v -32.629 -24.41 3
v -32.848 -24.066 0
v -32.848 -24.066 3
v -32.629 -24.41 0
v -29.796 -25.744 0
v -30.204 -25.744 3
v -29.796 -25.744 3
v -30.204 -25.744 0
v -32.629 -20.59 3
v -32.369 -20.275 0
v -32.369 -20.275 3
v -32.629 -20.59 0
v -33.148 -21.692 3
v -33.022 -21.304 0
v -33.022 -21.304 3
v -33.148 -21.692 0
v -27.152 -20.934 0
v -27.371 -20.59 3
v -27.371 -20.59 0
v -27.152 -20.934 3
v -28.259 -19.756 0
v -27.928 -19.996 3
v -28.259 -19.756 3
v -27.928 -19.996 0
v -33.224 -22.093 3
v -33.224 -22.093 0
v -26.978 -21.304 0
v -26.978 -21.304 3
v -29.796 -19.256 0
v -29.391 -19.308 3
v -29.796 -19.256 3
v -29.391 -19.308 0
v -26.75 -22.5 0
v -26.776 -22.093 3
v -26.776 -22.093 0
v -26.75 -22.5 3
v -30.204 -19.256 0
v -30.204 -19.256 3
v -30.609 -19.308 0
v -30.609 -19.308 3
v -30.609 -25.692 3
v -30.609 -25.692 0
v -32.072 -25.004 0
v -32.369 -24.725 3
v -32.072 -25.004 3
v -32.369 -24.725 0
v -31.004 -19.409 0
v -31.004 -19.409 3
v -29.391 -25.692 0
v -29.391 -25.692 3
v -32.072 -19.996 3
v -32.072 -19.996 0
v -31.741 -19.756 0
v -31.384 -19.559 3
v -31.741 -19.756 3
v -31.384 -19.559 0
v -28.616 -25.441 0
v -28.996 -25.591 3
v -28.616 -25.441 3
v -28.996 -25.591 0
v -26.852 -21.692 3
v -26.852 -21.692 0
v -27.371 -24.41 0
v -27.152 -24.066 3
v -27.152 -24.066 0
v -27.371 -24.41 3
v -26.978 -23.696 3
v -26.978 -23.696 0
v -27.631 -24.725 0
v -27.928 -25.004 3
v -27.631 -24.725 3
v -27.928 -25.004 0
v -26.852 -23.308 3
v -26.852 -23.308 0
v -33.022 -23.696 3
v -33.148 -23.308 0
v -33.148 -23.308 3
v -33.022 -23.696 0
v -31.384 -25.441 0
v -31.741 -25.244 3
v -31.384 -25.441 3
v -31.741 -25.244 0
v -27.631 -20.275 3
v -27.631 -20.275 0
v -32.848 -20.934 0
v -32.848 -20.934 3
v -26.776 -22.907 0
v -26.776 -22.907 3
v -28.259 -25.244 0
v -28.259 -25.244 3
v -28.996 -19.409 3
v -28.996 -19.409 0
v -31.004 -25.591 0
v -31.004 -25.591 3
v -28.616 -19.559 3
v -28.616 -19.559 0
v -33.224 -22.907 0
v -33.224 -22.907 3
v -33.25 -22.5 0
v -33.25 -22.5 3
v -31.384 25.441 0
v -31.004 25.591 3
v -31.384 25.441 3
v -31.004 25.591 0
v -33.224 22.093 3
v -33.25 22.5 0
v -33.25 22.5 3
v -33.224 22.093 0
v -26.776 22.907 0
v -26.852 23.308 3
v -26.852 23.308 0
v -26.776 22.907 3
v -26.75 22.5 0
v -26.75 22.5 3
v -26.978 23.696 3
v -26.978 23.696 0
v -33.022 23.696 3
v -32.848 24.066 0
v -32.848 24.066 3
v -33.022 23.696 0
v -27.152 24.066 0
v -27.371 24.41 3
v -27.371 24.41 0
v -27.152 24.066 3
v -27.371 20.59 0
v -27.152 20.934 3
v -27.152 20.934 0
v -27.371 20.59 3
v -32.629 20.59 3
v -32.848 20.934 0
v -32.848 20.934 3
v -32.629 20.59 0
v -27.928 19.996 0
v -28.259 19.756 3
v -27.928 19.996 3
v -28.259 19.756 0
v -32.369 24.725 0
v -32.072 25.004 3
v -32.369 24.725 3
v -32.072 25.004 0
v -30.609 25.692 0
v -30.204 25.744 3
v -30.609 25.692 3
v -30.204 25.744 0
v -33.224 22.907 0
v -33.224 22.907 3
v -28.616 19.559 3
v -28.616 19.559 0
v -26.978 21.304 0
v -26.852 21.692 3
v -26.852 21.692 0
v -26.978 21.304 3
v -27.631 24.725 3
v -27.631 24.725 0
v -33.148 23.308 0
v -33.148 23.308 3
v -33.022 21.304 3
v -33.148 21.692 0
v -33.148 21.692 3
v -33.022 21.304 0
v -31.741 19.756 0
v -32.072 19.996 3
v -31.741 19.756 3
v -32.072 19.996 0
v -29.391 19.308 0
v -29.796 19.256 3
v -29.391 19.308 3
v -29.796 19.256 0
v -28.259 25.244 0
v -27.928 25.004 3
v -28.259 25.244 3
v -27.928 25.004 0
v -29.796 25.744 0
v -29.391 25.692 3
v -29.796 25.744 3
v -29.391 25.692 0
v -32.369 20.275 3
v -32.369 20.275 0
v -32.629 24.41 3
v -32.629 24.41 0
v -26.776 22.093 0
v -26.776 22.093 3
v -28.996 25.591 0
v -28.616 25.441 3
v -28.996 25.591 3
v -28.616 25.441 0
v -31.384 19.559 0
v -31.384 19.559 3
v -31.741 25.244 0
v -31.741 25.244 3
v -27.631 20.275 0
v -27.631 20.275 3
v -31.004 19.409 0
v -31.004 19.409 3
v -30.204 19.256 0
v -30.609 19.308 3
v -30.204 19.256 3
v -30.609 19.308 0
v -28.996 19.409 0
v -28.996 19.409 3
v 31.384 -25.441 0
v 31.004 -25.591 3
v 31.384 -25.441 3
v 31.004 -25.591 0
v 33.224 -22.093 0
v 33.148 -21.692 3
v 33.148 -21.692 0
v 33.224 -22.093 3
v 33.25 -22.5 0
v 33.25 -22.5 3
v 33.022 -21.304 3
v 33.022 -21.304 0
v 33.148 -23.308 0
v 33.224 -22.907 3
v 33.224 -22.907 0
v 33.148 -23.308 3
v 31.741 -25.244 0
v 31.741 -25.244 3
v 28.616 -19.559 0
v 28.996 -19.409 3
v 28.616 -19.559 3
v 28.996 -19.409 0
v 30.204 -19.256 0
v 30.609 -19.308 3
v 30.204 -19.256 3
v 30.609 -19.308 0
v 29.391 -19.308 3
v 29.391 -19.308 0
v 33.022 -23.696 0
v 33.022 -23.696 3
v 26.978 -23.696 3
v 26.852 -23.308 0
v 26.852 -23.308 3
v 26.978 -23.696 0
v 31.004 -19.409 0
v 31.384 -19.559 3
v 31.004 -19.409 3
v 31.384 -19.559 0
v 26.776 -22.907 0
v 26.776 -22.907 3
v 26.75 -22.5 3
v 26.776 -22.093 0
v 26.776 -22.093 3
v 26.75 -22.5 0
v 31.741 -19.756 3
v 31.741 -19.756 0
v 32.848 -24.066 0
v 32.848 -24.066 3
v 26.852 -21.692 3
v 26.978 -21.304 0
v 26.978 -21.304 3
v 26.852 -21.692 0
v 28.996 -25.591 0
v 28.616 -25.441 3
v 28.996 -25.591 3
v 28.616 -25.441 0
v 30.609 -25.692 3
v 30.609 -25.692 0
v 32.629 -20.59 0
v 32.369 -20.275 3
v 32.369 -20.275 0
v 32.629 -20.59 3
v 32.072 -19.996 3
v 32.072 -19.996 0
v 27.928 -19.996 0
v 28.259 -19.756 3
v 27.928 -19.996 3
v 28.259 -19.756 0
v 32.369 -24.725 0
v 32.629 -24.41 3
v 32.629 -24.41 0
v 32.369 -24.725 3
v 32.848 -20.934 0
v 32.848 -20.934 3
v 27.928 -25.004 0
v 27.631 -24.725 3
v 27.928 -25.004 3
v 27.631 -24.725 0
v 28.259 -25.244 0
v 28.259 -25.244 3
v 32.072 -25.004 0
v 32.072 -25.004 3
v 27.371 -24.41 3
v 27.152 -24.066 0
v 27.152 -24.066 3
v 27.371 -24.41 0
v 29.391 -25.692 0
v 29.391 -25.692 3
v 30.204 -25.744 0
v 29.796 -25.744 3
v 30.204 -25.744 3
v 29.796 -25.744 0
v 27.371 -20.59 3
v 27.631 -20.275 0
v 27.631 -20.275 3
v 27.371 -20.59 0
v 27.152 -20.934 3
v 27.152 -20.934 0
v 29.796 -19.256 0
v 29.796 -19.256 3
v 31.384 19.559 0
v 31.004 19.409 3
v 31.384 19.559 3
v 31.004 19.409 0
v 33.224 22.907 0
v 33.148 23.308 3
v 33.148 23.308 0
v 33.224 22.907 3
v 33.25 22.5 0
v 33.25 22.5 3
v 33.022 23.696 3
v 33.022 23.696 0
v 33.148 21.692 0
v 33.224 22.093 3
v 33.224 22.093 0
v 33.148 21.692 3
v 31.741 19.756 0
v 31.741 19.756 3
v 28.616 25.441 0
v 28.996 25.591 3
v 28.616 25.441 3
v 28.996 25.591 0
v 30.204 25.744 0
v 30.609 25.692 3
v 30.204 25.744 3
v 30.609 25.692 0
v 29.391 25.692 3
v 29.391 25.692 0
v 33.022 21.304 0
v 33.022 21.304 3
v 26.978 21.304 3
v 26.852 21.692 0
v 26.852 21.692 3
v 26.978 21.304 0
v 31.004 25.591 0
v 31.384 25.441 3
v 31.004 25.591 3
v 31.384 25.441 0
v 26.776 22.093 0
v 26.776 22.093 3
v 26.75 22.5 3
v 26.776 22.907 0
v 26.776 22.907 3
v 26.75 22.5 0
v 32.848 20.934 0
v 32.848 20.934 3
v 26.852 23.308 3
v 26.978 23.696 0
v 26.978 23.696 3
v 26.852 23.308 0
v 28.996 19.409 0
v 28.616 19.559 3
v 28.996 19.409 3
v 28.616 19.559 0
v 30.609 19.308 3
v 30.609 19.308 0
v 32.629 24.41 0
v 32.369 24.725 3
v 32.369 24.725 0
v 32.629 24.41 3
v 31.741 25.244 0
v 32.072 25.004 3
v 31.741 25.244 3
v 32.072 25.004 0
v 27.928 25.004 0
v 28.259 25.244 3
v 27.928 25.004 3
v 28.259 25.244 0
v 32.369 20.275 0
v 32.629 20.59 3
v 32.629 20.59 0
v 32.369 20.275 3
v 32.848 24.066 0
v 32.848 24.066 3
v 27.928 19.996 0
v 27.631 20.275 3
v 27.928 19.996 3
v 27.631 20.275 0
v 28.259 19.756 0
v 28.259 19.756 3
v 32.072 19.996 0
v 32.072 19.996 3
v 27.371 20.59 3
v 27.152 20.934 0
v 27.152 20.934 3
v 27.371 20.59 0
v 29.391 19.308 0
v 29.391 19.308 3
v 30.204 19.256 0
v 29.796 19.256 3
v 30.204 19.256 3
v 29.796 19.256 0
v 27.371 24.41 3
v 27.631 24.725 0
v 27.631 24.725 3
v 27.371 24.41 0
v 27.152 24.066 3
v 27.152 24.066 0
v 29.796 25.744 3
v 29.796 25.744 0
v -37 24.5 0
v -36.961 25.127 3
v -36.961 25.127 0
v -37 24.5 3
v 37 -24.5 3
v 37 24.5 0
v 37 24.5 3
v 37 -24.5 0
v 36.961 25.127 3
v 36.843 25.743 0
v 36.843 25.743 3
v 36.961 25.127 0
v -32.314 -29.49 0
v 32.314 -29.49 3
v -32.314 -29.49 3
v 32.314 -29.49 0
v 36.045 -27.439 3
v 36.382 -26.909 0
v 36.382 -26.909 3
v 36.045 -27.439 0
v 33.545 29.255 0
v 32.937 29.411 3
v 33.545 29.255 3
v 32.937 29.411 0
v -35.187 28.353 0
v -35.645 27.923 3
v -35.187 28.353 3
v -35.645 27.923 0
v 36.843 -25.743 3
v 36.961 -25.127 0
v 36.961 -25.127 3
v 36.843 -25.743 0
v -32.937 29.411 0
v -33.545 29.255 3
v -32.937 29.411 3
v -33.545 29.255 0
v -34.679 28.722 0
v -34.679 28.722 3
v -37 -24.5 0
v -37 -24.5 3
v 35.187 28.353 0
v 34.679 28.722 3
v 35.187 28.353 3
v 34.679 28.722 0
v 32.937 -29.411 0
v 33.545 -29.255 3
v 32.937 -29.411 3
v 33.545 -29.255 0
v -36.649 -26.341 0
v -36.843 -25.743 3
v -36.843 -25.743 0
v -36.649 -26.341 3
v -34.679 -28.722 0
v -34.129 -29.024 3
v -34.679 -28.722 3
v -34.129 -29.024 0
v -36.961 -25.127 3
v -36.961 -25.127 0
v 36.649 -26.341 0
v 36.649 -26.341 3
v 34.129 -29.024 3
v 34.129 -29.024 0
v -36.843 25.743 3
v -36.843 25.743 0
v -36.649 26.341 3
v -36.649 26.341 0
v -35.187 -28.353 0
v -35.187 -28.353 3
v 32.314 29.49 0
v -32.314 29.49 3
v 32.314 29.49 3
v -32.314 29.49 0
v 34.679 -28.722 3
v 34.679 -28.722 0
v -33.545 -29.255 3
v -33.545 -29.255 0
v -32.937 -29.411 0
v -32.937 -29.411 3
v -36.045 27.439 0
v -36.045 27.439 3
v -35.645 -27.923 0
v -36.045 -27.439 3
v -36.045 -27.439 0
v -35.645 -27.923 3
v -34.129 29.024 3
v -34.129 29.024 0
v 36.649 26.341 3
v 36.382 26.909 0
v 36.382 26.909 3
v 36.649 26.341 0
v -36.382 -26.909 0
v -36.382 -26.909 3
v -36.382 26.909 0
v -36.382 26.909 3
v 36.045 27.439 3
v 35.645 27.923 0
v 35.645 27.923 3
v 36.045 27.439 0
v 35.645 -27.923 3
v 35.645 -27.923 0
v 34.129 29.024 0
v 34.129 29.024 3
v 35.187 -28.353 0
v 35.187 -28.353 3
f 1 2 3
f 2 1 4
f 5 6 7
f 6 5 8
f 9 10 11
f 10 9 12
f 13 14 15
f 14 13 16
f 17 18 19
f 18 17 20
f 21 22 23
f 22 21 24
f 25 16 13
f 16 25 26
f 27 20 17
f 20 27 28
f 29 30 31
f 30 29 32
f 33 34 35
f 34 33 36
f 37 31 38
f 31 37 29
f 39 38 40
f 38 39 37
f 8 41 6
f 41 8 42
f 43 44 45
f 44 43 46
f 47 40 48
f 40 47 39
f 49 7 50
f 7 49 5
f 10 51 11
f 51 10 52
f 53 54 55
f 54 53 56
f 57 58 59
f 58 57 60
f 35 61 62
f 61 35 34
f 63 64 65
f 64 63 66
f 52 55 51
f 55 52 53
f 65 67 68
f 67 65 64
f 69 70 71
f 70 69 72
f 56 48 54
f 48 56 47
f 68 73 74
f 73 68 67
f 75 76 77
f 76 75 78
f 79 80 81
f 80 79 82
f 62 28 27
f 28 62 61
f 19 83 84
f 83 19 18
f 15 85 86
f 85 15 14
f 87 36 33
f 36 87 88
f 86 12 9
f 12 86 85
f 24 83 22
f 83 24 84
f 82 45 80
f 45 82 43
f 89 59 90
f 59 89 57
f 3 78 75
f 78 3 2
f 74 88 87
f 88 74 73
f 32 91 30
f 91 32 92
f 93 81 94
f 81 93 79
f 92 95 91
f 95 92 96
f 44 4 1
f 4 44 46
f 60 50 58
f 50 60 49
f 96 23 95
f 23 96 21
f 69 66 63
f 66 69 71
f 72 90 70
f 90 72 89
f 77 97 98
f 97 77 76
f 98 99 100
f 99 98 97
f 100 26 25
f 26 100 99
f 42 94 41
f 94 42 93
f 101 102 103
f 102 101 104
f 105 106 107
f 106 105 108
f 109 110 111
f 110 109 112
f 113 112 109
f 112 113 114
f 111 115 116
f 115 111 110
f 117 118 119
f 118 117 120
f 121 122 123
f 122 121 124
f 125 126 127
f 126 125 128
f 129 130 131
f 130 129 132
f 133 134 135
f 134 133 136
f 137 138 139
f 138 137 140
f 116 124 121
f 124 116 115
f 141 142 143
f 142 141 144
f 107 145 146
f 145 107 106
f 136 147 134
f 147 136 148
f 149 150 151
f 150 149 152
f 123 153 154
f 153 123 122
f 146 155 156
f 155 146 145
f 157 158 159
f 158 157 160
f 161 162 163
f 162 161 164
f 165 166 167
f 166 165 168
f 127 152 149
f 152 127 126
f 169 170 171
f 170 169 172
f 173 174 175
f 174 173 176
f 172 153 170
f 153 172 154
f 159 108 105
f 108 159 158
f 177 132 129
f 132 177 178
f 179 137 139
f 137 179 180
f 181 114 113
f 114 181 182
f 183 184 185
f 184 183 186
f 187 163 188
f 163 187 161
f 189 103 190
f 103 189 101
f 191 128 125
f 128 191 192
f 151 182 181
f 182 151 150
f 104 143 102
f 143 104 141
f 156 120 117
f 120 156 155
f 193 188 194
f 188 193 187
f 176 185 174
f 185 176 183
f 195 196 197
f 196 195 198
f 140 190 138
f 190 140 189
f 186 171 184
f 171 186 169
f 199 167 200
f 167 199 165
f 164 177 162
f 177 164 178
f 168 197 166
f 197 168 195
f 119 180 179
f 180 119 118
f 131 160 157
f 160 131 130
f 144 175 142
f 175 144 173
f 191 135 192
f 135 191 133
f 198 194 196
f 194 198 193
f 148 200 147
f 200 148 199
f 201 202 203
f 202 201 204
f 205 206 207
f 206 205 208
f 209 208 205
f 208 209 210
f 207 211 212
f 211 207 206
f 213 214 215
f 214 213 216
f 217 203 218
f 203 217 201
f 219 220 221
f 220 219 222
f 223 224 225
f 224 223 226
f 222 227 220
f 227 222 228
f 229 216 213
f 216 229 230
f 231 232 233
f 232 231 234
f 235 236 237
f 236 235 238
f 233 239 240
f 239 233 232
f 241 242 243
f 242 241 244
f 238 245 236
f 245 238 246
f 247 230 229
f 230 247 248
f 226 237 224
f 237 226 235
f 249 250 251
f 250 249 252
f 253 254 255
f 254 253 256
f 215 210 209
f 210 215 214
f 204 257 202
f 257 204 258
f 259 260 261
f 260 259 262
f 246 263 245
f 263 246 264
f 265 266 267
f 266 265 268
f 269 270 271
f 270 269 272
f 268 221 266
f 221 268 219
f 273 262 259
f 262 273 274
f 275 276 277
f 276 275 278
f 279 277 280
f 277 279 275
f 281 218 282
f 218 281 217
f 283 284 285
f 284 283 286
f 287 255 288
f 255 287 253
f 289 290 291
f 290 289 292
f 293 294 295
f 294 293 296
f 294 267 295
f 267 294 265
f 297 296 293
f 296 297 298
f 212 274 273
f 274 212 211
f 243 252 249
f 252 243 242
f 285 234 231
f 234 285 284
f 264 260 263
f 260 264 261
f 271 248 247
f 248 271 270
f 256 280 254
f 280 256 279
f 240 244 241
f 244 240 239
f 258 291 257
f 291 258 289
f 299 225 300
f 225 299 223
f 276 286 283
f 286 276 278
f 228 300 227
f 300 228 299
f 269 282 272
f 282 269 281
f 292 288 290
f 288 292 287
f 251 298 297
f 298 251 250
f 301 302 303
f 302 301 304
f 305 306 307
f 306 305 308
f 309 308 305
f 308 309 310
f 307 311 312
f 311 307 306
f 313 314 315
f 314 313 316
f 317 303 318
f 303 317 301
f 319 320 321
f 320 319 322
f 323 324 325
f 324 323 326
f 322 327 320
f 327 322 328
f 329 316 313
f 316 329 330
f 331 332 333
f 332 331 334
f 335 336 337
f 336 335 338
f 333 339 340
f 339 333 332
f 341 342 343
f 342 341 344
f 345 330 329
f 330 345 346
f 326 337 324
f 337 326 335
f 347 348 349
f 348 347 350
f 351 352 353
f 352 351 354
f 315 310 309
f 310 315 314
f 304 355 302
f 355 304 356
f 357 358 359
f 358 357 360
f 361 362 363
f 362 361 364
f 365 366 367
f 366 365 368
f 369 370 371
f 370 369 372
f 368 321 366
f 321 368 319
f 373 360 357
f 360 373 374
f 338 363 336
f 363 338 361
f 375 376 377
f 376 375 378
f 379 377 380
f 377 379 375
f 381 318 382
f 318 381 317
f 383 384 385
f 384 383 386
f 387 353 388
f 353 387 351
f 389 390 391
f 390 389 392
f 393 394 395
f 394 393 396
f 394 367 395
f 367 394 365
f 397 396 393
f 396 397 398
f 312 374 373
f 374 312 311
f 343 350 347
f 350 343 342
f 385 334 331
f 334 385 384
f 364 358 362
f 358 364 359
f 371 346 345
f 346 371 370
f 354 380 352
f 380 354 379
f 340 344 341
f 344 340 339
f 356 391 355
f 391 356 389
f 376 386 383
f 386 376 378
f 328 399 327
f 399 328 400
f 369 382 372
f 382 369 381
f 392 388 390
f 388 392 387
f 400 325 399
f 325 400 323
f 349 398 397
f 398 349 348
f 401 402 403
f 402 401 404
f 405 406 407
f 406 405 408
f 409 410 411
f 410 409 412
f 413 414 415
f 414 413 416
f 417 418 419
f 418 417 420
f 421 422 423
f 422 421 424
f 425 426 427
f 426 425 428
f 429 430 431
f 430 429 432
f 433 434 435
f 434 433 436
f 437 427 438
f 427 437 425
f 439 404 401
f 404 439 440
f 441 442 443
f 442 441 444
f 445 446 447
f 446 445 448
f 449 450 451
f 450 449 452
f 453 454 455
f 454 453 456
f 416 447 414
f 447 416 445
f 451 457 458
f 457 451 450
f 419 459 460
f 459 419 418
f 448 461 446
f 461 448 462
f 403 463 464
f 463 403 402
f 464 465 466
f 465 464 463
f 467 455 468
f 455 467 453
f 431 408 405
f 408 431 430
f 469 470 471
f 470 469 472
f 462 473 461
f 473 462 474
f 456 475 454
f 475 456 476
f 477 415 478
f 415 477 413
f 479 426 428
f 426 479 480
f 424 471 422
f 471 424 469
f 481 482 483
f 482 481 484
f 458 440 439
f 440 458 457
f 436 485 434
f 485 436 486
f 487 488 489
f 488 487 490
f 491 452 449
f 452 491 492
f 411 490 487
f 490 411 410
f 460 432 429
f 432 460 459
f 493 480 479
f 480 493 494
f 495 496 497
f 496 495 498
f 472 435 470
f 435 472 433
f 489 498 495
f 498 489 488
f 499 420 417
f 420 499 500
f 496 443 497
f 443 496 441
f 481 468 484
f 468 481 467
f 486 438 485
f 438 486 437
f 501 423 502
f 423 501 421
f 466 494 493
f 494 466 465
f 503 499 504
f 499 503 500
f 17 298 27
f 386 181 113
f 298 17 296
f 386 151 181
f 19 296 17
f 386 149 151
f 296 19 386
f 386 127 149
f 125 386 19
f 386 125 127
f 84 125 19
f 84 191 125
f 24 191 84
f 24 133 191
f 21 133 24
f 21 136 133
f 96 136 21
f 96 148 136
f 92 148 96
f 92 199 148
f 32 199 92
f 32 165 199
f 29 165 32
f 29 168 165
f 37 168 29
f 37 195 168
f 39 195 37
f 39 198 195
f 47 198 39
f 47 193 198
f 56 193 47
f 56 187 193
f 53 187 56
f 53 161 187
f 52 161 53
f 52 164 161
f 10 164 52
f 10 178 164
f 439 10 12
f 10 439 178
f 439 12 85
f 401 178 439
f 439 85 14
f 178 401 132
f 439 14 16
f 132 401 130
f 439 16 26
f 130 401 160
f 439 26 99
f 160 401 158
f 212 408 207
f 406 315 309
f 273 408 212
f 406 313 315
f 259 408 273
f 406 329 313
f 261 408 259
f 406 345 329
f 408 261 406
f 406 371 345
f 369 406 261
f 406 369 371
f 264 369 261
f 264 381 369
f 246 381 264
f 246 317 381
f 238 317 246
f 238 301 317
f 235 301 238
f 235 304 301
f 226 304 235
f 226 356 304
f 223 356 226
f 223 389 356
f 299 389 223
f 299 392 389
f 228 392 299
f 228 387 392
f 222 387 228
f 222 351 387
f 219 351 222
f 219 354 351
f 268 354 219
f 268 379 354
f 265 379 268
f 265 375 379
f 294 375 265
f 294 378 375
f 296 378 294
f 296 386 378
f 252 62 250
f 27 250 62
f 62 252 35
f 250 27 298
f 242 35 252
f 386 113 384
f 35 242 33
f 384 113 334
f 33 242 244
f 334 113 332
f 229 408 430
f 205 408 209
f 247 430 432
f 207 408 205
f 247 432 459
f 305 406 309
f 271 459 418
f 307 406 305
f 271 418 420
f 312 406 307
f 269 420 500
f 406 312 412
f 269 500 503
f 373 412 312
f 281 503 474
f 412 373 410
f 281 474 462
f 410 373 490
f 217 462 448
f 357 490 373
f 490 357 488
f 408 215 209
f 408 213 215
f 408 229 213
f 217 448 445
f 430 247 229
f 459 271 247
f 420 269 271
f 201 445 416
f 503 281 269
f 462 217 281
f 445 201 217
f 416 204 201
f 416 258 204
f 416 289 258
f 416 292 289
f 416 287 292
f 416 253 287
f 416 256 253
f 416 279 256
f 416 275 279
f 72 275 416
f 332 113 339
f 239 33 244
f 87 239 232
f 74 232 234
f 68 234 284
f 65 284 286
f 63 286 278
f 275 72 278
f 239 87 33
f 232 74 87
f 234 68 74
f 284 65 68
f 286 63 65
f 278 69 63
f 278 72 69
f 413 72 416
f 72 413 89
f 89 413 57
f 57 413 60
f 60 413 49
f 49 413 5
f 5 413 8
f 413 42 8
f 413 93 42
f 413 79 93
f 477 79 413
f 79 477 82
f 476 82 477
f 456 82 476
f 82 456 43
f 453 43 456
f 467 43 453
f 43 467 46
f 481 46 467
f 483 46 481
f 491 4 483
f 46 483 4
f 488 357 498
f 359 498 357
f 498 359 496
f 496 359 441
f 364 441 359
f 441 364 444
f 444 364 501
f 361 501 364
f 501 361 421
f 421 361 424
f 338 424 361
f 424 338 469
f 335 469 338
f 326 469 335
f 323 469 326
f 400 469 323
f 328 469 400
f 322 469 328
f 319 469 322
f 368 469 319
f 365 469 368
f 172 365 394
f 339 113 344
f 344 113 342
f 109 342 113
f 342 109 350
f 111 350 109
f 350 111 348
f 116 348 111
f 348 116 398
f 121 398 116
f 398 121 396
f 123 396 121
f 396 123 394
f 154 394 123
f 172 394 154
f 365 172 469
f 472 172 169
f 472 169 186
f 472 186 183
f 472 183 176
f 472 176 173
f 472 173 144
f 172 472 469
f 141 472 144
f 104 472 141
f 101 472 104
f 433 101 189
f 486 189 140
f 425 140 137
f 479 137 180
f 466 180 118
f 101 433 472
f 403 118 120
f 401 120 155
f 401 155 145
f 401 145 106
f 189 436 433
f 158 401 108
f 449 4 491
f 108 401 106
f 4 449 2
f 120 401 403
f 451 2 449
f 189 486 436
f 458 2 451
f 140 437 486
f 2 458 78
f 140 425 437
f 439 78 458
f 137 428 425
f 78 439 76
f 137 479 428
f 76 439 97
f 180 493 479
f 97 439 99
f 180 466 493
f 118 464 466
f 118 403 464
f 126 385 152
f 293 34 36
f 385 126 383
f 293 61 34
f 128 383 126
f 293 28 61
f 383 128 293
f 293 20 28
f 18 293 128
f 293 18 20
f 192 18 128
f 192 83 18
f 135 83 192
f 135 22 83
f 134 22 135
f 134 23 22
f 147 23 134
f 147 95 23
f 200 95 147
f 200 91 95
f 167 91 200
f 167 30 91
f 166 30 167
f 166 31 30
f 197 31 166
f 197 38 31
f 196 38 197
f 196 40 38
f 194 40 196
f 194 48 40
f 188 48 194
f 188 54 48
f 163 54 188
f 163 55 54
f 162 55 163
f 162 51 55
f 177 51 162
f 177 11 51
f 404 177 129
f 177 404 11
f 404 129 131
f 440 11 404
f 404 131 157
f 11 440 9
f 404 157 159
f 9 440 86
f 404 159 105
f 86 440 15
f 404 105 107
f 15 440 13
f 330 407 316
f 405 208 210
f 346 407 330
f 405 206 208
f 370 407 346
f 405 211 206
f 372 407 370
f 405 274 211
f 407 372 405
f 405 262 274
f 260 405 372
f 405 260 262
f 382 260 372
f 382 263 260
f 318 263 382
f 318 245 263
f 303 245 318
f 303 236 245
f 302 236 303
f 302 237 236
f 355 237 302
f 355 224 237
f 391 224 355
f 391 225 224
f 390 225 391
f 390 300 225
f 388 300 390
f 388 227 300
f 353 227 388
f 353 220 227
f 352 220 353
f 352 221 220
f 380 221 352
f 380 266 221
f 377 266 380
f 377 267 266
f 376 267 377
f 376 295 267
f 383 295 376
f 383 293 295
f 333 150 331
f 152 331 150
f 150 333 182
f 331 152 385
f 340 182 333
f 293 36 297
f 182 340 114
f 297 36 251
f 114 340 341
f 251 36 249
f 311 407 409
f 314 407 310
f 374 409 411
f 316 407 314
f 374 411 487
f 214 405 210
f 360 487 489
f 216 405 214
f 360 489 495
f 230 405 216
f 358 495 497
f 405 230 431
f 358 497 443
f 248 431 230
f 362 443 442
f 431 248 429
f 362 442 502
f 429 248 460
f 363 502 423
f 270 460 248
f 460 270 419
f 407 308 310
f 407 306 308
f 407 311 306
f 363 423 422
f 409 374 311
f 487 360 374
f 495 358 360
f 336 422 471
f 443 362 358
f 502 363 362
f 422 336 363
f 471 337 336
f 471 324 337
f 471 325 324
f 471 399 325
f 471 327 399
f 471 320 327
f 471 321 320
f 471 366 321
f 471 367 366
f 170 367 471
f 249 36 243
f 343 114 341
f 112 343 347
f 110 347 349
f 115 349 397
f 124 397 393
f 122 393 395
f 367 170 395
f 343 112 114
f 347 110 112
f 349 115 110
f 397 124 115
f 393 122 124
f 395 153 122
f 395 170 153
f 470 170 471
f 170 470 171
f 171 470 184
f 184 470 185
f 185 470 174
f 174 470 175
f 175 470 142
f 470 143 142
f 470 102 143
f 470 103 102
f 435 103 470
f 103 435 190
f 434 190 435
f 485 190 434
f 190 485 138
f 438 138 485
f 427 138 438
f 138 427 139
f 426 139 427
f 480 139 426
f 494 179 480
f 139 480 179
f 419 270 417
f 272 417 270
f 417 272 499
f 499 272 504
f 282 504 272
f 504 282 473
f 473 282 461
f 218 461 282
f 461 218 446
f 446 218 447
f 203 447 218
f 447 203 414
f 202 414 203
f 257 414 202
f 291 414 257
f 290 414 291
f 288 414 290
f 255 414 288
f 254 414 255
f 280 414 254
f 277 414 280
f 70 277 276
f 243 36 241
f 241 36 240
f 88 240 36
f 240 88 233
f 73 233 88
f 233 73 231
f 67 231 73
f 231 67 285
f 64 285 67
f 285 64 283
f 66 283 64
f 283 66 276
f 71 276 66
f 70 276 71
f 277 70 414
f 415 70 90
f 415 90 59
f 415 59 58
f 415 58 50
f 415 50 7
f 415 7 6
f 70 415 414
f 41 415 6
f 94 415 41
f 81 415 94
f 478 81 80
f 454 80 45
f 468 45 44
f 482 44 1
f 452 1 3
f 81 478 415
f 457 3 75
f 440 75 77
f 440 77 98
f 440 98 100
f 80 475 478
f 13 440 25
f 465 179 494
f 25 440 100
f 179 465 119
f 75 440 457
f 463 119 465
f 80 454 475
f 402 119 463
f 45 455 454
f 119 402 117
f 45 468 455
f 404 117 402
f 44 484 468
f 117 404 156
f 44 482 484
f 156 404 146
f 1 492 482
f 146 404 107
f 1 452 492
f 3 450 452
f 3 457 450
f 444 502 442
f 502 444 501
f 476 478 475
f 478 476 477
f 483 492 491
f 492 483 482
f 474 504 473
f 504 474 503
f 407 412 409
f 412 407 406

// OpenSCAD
$fn = 50;


difference() {
	union() {
		hull() {
			translate(v = [-32.0000000000, 24.5000000000, 0]) {
				cylinder(h = 3, r = 5);
			}
			translate(v = [32.0000000000, 24.5000000000, 0]) {
				cylinder(h = 3, r = 5);
			}
			translate(v = [-32.0000000000, -24.5000000000, 0]) {
				cylinder(h = 3, r = 5);
			}
			translate(v = [32.0000000000, -24.5000000000, 0]) {
				cylinder(h = 3, r = 5);
			}
		}
	}
	union() {
		translate(v = [-30.0000000000, -22.5000000000, -100.0000000000]) {
			cylinder(h = 200, r = 3.2500000000);
		}
		translate(v = [-30.0000000000, 22.5000000000, -100.0000000000]) {
			cylinder(h = 200, r = 3.2500000000);
		}
		translate(v = [30.0000000000, -22.5000000000, -100.0000000000]) {
			cylinder(h = 200, r = 3.2500000000);
		}
		translate(v = [30.0000000000, 22.5000000000, -100.0000000000]) {
			cylinder(h = 200, r = 3.2500000000);
		}
	}
}
